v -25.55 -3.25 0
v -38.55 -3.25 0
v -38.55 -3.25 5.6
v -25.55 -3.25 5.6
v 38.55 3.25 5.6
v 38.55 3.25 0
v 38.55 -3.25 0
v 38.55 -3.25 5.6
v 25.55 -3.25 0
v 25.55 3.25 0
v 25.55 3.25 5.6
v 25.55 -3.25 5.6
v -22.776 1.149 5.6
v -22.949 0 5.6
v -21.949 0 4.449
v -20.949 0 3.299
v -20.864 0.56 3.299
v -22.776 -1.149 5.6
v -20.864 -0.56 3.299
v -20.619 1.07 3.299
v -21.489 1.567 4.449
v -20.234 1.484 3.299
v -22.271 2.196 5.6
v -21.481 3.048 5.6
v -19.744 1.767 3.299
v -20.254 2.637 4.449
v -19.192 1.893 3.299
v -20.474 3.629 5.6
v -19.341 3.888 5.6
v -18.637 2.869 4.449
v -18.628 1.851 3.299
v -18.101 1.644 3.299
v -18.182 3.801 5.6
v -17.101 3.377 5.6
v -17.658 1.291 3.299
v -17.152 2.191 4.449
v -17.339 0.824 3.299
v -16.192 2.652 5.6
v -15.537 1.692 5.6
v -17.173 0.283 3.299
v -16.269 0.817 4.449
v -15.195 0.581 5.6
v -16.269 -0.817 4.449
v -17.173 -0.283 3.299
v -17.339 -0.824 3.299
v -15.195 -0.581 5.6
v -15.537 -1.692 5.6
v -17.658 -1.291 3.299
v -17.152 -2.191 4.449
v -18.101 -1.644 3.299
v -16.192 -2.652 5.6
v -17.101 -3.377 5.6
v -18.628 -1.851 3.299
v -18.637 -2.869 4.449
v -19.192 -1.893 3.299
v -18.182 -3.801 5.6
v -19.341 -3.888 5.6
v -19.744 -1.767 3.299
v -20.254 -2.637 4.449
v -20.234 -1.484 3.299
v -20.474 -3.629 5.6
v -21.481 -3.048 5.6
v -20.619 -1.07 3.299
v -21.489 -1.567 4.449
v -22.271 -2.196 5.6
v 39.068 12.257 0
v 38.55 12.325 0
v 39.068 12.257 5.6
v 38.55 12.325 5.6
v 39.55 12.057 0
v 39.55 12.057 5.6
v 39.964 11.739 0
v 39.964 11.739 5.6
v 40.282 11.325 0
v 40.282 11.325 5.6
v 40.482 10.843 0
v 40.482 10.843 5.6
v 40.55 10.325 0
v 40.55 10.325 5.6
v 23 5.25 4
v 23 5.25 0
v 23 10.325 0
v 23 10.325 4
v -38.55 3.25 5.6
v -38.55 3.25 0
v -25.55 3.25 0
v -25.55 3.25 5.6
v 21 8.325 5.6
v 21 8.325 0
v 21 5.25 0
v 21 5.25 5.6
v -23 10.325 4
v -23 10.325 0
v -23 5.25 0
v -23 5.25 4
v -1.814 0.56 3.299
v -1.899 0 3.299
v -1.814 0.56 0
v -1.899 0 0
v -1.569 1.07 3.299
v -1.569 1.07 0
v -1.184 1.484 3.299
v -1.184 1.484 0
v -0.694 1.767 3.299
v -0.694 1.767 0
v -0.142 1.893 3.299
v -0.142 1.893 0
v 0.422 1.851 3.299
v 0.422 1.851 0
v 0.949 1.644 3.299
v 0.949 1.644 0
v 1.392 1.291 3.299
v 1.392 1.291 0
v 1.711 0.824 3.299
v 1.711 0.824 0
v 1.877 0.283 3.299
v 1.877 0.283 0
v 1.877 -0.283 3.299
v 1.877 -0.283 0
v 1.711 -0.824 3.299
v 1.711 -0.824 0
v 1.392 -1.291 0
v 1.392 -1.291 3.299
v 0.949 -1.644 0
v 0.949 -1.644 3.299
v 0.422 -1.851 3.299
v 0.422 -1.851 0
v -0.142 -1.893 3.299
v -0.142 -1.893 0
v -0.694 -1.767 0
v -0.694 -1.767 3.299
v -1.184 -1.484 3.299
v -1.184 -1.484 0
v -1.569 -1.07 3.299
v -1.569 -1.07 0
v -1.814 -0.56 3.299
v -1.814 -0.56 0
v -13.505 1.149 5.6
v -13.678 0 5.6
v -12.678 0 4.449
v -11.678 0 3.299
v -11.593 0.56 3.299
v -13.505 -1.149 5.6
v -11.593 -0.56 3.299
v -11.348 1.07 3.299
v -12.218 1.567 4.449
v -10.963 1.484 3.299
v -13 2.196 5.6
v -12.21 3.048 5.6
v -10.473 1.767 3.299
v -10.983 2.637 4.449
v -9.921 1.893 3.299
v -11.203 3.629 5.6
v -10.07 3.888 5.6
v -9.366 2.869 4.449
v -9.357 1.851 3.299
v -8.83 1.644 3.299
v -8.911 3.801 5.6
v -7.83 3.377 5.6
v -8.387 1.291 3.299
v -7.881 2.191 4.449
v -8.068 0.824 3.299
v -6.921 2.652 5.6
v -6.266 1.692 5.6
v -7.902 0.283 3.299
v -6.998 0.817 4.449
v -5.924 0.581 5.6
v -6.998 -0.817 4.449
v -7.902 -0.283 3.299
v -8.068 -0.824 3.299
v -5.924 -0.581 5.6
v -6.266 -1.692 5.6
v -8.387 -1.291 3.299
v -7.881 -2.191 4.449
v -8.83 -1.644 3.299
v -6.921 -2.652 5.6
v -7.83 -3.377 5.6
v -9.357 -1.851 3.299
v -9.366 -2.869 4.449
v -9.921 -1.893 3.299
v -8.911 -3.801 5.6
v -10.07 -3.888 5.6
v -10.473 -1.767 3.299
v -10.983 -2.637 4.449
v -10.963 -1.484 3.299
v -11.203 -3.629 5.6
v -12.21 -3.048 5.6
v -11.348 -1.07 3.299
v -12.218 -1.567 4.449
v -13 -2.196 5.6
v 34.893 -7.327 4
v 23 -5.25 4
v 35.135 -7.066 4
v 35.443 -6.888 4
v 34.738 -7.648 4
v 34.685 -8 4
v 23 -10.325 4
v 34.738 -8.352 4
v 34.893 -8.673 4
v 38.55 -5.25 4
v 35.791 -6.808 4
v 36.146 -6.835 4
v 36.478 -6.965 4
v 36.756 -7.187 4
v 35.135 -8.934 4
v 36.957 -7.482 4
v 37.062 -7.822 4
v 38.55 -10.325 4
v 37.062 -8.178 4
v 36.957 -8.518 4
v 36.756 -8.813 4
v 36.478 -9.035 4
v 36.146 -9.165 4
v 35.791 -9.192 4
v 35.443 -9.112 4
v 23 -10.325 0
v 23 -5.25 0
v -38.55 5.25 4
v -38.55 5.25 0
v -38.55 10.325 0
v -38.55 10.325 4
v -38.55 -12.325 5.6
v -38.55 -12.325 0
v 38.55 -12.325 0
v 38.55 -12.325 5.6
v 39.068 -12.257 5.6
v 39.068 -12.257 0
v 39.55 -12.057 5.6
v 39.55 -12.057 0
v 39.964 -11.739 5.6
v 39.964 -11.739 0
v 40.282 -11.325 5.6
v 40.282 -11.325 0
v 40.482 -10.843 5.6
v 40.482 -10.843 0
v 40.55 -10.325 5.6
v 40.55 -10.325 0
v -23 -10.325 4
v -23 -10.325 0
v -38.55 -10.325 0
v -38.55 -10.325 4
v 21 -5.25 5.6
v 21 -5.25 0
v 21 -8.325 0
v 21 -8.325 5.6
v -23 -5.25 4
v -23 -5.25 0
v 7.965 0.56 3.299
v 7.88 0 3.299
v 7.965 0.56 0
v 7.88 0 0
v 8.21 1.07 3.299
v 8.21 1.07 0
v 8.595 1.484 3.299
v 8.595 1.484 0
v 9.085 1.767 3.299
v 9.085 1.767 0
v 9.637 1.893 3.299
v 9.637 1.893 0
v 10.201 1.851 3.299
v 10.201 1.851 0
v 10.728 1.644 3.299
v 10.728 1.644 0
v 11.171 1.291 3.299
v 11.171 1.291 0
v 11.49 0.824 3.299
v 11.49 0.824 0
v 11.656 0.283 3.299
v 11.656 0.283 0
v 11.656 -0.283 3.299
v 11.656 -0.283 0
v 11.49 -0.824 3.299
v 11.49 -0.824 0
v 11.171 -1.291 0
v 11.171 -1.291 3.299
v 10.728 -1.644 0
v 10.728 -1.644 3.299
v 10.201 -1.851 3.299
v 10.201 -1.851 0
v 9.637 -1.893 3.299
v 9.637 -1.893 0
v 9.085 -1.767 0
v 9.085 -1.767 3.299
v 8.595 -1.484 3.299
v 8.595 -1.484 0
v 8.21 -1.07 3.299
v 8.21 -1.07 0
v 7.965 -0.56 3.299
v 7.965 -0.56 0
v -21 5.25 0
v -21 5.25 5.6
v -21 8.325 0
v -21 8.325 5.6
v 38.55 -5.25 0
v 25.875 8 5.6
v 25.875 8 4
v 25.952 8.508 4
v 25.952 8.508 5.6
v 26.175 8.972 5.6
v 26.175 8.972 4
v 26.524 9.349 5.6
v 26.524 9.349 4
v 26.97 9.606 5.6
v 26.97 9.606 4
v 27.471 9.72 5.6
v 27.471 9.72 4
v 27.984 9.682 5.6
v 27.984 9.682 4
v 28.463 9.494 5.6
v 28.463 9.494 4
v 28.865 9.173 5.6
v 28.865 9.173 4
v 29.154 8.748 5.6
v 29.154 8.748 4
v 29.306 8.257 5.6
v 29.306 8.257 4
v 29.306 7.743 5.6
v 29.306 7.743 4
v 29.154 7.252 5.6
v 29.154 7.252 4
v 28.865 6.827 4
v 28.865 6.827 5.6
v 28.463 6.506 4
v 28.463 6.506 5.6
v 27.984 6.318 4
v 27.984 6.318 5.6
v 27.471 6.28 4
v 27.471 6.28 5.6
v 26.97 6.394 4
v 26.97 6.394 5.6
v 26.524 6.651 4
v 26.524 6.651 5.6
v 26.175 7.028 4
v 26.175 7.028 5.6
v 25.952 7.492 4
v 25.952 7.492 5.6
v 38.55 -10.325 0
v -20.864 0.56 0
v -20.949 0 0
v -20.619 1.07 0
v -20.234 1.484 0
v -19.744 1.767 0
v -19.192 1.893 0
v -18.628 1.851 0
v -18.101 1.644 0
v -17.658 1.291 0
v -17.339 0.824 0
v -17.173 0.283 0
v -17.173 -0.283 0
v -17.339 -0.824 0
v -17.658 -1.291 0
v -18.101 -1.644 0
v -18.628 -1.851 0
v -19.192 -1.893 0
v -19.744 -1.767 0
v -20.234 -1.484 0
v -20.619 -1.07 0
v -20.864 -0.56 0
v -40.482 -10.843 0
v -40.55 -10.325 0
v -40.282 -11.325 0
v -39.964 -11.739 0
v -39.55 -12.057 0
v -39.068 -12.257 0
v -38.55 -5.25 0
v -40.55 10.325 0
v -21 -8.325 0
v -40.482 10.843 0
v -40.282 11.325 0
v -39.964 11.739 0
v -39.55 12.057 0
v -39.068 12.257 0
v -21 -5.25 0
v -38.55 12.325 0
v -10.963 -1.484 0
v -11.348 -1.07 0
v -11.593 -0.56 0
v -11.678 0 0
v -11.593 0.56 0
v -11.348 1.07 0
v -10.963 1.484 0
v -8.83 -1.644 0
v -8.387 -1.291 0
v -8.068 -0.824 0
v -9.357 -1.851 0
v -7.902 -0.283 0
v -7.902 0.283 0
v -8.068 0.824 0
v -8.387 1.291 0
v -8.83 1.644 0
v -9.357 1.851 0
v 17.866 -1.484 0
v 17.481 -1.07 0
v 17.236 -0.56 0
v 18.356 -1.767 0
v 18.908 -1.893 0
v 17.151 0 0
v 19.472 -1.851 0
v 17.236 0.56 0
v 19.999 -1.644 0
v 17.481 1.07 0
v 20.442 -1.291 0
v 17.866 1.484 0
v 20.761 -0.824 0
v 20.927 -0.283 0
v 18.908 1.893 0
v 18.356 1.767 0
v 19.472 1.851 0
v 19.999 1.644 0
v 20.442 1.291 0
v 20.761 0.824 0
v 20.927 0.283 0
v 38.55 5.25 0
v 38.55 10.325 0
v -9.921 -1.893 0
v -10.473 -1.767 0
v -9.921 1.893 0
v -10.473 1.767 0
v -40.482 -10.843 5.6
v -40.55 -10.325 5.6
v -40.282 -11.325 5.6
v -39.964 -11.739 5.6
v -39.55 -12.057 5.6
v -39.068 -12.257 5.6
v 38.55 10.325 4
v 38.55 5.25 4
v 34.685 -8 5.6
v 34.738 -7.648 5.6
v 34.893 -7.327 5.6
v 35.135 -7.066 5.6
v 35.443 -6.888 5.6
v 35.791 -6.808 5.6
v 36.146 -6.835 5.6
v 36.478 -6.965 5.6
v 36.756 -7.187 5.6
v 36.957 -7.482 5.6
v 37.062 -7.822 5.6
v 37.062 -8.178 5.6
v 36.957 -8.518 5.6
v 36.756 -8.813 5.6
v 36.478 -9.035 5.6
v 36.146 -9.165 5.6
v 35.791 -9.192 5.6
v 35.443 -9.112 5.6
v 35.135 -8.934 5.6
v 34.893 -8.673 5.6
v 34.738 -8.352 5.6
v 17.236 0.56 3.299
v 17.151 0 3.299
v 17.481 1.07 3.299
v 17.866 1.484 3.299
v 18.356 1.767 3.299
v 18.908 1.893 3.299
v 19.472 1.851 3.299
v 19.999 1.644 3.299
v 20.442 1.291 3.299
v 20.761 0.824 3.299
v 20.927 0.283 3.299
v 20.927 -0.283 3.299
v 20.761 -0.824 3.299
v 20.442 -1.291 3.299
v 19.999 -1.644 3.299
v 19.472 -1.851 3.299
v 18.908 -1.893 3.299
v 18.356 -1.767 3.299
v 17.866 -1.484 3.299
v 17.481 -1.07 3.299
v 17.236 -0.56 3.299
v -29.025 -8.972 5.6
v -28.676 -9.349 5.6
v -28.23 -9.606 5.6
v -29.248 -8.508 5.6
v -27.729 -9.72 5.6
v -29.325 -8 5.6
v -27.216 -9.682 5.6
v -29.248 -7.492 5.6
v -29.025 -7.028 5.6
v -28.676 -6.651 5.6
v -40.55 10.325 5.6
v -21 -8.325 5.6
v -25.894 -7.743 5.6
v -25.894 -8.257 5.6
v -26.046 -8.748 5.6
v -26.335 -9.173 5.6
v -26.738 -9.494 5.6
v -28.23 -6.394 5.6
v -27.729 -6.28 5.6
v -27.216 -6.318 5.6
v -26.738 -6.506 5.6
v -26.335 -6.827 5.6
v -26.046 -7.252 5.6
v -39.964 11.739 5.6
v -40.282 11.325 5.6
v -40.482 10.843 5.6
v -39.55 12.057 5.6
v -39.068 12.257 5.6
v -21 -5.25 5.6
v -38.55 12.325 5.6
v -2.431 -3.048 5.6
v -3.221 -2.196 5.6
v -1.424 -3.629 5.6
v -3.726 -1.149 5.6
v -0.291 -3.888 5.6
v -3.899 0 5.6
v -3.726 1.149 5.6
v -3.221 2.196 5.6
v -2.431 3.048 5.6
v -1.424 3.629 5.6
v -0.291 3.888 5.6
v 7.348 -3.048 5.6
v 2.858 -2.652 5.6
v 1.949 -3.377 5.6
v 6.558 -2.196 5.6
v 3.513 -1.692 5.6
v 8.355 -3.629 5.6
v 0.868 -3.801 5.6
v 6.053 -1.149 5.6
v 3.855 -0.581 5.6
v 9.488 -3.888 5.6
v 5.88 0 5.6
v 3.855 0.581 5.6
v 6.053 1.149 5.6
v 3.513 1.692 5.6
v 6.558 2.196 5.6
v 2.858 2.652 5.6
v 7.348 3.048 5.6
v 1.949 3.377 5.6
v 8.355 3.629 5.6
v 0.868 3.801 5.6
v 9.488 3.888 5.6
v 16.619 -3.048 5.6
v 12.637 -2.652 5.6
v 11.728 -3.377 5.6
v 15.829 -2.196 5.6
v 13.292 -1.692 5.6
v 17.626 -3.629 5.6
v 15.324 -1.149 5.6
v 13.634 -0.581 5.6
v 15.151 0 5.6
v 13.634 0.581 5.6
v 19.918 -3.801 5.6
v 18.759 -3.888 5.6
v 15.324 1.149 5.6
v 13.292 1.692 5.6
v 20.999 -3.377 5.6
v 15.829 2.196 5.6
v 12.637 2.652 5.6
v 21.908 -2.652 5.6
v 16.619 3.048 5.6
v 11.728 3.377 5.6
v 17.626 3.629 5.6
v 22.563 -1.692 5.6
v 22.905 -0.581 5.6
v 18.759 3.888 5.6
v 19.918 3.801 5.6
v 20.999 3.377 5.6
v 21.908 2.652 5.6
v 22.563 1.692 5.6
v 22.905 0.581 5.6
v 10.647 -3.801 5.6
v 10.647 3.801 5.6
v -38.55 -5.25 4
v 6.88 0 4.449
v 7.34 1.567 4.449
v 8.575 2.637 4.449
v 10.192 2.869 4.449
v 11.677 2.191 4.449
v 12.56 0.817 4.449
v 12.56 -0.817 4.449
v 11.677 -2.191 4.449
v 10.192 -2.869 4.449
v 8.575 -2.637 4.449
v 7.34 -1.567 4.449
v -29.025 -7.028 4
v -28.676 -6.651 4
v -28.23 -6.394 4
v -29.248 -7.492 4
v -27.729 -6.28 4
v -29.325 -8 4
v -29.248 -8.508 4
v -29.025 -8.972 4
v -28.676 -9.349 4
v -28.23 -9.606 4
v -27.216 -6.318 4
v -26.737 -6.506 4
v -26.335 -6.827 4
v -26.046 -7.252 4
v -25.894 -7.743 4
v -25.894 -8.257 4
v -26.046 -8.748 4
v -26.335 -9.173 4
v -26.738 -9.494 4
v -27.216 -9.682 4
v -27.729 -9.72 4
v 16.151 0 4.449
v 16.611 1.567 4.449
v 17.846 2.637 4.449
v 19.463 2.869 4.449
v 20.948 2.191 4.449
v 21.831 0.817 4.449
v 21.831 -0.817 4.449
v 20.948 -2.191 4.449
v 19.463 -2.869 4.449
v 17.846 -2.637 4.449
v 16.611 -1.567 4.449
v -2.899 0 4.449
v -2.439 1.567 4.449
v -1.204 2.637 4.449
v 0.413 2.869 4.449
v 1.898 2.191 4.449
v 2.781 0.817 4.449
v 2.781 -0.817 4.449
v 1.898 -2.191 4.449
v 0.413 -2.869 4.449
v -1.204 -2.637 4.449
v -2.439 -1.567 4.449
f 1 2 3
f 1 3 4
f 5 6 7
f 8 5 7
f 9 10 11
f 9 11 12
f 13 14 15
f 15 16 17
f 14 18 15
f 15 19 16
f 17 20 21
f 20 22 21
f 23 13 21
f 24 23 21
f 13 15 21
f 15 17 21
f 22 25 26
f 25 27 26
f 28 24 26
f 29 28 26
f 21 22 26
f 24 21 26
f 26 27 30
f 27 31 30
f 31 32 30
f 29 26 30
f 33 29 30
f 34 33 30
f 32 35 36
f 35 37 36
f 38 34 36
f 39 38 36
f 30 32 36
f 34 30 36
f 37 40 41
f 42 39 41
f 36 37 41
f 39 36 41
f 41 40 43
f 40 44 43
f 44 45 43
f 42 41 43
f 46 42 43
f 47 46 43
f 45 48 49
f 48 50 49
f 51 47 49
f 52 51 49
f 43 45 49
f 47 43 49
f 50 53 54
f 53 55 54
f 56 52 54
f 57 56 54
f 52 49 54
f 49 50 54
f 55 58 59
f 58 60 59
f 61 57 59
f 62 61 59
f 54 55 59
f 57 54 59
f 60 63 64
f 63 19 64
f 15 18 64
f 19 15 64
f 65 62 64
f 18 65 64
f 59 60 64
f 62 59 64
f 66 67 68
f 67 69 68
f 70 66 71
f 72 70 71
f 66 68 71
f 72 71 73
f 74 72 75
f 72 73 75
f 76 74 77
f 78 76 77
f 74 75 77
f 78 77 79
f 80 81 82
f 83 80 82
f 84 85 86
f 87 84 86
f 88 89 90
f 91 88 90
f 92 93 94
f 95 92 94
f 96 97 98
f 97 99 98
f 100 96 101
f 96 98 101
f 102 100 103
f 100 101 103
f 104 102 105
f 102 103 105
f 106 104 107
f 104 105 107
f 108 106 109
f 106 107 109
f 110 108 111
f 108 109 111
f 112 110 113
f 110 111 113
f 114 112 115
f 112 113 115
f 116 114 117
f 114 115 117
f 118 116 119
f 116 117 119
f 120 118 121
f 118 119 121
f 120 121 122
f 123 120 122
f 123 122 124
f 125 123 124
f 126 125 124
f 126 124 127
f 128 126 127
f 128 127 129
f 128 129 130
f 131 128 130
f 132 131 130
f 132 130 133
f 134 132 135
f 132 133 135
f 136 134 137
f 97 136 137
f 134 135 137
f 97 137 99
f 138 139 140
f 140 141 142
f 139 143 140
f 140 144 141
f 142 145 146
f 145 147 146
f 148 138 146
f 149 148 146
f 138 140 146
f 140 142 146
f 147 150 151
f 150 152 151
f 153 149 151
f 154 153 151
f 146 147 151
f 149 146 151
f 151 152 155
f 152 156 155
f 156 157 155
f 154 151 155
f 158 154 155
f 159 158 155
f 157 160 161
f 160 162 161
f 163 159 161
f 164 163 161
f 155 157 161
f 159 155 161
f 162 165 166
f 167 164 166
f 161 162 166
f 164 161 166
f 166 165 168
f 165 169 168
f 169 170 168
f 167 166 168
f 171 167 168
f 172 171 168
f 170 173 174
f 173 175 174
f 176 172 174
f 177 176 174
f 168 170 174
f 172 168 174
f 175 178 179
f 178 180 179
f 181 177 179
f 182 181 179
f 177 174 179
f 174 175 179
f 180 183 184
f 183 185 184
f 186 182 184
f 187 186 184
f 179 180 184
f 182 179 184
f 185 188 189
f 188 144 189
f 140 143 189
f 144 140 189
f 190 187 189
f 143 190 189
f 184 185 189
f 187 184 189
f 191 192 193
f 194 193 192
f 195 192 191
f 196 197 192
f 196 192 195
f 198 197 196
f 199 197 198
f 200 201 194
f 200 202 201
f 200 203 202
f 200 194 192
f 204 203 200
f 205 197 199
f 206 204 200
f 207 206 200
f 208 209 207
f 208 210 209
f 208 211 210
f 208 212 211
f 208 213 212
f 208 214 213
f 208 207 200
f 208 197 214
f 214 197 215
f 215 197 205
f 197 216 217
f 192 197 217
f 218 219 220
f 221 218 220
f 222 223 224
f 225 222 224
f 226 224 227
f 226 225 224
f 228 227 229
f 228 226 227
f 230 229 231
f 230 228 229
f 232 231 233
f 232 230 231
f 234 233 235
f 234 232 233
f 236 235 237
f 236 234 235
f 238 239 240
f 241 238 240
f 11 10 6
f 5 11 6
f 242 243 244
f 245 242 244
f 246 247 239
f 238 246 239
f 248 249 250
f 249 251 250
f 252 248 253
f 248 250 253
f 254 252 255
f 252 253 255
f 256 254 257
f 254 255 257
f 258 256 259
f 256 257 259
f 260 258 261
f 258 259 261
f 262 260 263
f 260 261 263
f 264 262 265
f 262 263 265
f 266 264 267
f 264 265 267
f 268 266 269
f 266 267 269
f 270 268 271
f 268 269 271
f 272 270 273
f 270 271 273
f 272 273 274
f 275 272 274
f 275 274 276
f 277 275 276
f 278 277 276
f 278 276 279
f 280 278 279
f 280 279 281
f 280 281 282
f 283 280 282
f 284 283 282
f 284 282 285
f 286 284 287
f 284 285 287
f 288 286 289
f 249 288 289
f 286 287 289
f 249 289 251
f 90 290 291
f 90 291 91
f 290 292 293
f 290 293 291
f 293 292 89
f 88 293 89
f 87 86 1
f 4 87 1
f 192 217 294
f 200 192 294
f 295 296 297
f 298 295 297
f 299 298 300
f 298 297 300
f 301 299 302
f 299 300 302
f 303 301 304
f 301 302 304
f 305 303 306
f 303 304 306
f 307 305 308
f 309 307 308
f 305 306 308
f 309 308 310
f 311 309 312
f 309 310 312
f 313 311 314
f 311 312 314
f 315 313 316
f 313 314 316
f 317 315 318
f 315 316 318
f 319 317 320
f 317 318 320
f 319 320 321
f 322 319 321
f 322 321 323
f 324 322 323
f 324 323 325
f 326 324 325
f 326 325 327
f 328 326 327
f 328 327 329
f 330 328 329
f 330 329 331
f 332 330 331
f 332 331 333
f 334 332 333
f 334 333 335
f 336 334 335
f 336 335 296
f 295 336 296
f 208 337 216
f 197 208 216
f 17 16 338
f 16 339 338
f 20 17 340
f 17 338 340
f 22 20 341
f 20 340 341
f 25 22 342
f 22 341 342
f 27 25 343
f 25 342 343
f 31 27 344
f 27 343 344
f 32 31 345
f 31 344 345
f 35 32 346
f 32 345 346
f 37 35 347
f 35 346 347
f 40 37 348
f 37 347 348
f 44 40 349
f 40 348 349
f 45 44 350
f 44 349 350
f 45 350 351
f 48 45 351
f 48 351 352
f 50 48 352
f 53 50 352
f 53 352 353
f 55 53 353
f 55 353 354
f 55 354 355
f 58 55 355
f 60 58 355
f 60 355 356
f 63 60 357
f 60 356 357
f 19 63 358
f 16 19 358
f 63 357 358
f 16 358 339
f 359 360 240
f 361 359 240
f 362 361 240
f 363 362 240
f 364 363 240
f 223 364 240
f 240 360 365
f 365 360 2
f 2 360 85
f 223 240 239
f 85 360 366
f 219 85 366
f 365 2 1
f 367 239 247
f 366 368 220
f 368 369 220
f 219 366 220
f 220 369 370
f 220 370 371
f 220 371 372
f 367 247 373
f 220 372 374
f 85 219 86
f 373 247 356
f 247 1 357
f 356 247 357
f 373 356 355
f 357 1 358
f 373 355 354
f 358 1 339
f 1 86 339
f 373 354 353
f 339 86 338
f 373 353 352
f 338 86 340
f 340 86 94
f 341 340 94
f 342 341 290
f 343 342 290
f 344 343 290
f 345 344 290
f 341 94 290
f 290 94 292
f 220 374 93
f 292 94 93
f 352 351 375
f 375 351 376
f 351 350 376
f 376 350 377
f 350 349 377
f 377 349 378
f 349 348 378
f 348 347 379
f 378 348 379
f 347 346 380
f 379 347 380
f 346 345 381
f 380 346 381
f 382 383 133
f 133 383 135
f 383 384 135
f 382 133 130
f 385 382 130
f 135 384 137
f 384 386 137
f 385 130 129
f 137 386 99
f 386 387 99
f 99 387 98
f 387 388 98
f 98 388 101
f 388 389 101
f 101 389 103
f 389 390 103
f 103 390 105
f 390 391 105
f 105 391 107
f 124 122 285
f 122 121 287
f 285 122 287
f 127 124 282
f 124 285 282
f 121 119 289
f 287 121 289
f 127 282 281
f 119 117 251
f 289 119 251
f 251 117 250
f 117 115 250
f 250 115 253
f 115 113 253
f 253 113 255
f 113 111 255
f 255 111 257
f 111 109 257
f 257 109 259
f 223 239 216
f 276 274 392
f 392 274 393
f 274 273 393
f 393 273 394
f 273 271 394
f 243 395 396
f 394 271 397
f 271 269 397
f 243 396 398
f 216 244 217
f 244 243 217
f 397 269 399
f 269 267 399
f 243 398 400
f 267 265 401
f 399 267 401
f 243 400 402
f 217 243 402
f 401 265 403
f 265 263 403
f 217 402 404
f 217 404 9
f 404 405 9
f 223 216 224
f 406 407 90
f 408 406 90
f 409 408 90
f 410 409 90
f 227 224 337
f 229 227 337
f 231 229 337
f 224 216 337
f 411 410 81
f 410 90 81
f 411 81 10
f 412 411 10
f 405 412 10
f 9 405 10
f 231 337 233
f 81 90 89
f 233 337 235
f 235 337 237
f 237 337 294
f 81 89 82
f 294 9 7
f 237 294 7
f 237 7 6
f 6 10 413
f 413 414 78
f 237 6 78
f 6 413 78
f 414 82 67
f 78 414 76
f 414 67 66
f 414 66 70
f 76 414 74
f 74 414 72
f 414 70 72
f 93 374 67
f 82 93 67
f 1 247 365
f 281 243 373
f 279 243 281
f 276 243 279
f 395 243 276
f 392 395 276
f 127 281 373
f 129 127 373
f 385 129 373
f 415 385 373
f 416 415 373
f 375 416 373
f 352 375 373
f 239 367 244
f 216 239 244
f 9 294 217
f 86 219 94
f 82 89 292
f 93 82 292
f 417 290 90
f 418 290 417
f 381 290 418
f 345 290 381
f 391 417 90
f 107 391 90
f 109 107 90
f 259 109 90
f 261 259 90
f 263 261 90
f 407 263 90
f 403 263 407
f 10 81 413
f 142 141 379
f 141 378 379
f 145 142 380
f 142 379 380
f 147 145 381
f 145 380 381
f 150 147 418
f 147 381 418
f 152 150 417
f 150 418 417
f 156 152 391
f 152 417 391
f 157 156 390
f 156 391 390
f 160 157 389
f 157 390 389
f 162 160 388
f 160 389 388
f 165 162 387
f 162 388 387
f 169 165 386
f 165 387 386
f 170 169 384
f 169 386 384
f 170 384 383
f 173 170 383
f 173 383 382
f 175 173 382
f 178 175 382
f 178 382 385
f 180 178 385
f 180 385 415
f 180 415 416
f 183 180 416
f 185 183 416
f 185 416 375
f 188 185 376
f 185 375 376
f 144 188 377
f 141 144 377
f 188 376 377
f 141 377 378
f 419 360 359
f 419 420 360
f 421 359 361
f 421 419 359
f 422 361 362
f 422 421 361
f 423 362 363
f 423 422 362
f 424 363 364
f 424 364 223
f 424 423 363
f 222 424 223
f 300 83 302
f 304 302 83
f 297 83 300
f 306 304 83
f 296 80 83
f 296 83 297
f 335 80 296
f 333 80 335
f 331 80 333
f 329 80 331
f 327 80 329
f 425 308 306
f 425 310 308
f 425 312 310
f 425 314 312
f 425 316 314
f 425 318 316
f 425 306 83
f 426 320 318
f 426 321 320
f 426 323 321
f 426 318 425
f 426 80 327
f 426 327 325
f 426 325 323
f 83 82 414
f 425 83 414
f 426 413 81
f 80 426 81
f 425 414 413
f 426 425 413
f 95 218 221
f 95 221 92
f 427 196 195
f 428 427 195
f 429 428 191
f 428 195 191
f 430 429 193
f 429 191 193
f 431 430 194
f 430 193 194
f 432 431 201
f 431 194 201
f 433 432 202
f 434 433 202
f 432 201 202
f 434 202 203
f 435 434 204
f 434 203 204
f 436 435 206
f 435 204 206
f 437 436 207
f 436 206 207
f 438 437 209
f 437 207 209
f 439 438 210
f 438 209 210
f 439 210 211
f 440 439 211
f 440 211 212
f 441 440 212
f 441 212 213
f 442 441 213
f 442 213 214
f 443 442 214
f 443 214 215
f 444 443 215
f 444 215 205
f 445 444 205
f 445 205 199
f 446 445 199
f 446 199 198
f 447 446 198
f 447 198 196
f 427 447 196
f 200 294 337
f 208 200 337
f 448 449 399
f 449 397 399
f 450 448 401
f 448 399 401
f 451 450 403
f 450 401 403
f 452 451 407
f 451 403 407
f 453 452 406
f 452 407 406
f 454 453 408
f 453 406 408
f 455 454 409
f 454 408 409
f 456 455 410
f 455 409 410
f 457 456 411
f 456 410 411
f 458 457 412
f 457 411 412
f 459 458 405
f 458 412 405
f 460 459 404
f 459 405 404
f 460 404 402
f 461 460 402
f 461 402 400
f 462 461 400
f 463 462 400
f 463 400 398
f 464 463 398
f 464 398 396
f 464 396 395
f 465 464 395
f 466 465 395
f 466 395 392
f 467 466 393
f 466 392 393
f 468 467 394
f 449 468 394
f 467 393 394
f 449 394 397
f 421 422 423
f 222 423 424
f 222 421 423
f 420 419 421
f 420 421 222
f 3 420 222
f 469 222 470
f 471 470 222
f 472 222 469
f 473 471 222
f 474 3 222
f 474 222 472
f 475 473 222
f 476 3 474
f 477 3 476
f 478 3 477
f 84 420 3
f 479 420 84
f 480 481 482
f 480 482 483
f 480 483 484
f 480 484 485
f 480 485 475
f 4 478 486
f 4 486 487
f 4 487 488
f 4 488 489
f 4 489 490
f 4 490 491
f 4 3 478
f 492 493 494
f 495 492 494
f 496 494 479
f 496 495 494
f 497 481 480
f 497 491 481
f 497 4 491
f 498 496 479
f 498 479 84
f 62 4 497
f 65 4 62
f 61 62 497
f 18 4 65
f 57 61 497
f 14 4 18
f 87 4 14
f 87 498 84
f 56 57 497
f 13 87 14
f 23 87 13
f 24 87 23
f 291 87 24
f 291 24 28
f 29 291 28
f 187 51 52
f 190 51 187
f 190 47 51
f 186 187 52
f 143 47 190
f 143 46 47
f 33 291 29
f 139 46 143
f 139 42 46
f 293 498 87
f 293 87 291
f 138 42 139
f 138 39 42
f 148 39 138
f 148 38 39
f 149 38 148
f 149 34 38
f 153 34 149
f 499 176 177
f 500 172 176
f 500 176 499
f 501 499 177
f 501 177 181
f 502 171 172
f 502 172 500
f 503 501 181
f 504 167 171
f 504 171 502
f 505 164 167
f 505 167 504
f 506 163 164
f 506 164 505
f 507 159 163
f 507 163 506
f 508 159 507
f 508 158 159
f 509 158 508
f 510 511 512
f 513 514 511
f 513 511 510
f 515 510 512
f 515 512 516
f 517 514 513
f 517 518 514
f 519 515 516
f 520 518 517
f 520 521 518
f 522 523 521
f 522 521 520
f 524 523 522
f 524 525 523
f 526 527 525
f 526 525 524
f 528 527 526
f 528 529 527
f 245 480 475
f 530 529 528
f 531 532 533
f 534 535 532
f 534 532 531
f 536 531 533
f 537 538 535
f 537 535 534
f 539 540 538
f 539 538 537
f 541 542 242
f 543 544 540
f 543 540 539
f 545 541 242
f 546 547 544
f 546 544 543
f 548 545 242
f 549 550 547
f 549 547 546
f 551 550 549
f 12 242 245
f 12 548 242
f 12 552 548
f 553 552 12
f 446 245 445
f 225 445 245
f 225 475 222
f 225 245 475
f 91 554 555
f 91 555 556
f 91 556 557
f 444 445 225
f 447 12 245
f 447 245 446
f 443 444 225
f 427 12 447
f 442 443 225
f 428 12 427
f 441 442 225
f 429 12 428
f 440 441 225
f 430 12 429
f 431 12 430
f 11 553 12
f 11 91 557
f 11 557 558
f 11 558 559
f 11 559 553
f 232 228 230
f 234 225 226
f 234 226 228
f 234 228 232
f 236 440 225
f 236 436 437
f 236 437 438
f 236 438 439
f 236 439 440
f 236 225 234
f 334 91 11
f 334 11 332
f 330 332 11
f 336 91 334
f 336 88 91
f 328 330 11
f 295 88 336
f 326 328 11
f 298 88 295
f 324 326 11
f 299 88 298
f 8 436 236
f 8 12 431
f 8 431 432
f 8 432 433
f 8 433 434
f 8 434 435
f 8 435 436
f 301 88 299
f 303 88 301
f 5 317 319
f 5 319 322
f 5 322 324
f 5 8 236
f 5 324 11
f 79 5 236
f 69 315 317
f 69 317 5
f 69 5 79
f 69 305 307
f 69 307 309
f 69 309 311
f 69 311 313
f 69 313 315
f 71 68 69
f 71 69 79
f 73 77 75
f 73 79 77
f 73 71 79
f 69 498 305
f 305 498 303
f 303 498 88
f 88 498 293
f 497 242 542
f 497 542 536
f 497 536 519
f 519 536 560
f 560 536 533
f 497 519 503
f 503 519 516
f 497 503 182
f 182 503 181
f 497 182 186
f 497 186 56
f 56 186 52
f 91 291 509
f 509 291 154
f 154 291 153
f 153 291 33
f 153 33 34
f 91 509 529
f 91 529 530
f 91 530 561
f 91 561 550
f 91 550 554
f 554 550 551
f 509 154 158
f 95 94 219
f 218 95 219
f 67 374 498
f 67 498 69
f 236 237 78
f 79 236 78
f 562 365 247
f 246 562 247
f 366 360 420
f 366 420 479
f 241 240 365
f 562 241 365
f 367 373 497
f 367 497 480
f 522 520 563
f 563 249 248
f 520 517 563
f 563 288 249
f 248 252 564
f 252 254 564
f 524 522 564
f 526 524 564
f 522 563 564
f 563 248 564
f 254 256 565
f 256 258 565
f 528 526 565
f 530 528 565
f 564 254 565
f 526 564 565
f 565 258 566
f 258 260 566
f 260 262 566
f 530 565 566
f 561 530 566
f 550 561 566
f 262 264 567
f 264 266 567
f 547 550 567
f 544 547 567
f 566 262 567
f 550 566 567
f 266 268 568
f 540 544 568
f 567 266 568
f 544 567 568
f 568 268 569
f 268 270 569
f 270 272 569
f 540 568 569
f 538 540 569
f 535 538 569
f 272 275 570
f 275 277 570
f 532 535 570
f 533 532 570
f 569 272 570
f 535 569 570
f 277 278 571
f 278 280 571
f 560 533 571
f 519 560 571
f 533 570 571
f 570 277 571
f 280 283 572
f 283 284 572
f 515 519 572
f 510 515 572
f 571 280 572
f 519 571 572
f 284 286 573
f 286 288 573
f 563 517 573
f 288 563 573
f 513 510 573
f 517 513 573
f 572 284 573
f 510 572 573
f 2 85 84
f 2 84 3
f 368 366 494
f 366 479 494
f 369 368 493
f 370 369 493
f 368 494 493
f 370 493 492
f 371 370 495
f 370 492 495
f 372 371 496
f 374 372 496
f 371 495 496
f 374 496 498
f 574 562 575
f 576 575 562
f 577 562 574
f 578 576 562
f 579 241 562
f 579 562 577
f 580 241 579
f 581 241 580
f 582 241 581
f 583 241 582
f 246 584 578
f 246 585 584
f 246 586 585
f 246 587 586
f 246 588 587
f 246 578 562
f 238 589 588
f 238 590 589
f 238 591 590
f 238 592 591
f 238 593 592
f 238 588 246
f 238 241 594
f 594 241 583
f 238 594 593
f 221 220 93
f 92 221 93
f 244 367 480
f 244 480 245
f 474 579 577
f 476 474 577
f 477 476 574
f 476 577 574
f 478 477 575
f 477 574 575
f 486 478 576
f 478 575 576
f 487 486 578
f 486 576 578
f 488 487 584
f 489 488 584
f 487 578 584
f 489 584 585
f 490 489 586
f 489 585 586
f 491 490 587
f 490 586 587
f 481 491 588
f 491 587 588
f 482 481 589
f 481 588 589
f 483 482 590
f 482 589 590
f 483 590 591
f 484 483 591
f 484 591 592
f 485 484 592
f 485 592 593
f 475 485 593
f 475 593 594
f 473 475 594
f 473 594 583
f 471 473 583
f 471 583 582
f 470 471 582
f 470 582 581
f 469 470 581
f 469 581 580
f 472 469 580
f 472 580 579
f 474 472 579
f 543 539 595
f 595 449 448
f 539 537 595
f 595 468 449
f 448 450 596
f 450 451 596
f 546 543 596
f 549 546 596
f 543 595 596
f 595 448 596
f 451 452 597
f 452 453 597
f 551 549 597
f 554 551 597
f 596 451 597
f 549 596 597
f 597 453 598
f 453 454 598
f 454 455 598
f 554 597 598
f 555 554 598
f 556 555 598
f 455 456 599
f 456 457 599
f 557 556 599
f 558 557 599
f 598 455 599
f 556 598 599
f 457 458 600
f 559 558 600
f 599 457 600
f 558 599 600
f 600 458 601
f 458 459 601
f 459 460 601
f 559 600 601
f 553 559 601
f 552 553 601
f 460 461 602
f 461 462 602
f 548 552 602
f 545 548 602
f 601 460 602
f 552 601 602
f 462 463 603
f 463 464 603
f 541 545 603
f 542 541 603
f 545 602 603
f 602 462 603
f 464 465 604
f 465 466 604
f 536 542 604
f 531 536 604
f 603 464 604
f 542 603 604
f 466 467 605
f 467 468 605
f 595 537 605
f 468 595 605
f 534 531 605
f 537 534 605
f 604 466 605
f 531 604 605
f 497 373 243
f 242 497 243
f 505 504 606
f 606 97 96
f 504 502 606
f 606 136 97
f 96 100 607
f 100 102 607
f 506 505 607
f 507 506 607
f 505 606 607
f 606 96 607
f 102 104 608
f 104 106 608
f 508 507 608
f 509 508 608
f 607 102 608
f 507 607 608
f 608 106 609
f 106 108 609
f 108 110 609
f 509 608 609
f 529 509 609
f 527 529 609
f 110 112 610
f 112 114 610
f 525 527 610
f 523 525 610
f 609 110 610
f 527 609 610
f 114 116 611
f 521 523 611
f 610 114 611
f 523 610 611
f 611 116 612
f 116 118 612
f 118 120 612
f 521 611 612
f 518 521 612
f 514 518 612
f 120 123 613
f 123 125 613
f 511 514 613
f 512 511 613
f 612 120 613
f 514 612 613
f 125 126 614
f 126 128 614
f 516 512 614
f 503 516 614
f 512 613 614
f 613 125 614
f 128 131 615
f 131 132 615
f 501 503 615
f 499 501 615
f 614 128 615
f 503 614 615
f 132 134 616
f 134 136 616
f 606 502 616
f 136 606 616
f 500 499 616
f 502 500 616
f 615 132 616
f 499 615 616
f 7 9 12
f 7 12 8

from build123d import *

# Parameters (mm, degrees)
F0_W           = 81.1
F0_H           = 24.65
F1_DEPTH       = 5.6
F3_D           = 3.45
F4_D           = 2.39
F6_D           = 3.7973
F6_CSINK_D     = 7.7978
F6_CSINK_ANGLE = 82
F7_R           = 1.725
F7_R_2         = 1.195
F8_DEPTH       = 3.9998
F7_W           = 42
F7_H           = 3.075
F7_W_2         = 13
F7_H_2         = 6.5
F9_DEPTH       = 5.6
F10_R          = 2


# Not quite as in the source:
# - a feature names something its author has since deleted; it is built from what else it names


with BuildPart() as f1:
    # F0 (on Top) → F1 (new body)
    with BuildSketch(Plane.XY):
        Rectangle(F0_W, F0_H)
    extrude(amount=F1_DEPTH)

    # F3 (through all)
    with Locations(Plane.XY.offset(5.6)):
        with Locations((-27.6, -8), (27.6, 8)):
            Hole(F3_D / 2)

    # F4 (through all)
    with Locations(Plane.XY.offset(5.6)):
        with Locations((35.88, -8)):
            Hole(F4_D / 2)

    # F6 (through all)
    with Locations(Plane.XY.offset(5.6)):
        with Locations((-19.05, 0), (-9.779, 0), (0, 0), (9.779, 0), (19.05, 0)):
            CounterSinkHole(F6_D / 2, F6_CSINK_D / 2, counter_sink_angle=F6_CSINK_ANGLE)

    # F7 (on face) → F8 (cut, through all)
    with BuildSketch(Plane(origin=(0, 0, 0), x_dir=(1, 0, 0), z_dir=(0, 0, -1))):
        Polygon((-38.55, 10.325), (-38.55, 5.25), (-23.55, 5.25), (-23, 5.25), (-23, 10.325), align=None)
        with Locations((-27.6, 8)):
            Circle(F7_R, mode=Mode.SUBTRACT)
        Polygon((-23.55, -5.25), (-38.55, -5.25), (-38.55, -10.325), (-23, -10.325), (-23, -5.25), align=None)
        Polygon((38.55, -10.325), (38.55, -5.25), (23.55, -5.25), (23, -5.25), (23, -10.325), align=None)
        with Locations((27.6, -8)):
            Circle(F7_R, mode=Mode.SUBTRACT)
        Polygon((23.55, 5.25), (38.55, 5.25), (38.55, 10.325), (23, 10.325), (23, 5.25), align=None)
        with Locations((35.88, 8)):
            Circle(F7_R_2, mode=Mode.SUBTRACT)
    extrude(amount=-F8_DEPTH, mode=Mode.SUBTRACT)

    # F7 (on face) → F9 (cut, through all)
    with BuildSketch(Plane(origin=(0, 0, 0), x_dir=(1, 0, 0), z_dir=(0, 0, -1))):
        with Locations((0, -6.7875)):
            Rectangle(F7_W, F7_H)
        with Locations((-32.05, 0)):
            Rectangle(F7_W_2, F7_H_2)
        with Locations((32.05, 0)):
            Rectangle(F7_W_2, F7_H_2)
        with Locations((0, 6.7875)):
            Rectangle(F7_W, F7_H)
    extrude(amount=-F9_DEPTH, mode=Mode.SUBTRACT)

    # F10
    f10_edges = [f1.edges().sort_by_distance(p)[0] for p in [
        (40.55, 12.325, 2.8),
        (-40.55, 12.325, 2.8),
        (-40.55, -12.325, 2.8),
        (40.55, -12.325, 2.8),
    ]]
    fillet(f10_edges, radius=F10_R)


solid = f1.part
